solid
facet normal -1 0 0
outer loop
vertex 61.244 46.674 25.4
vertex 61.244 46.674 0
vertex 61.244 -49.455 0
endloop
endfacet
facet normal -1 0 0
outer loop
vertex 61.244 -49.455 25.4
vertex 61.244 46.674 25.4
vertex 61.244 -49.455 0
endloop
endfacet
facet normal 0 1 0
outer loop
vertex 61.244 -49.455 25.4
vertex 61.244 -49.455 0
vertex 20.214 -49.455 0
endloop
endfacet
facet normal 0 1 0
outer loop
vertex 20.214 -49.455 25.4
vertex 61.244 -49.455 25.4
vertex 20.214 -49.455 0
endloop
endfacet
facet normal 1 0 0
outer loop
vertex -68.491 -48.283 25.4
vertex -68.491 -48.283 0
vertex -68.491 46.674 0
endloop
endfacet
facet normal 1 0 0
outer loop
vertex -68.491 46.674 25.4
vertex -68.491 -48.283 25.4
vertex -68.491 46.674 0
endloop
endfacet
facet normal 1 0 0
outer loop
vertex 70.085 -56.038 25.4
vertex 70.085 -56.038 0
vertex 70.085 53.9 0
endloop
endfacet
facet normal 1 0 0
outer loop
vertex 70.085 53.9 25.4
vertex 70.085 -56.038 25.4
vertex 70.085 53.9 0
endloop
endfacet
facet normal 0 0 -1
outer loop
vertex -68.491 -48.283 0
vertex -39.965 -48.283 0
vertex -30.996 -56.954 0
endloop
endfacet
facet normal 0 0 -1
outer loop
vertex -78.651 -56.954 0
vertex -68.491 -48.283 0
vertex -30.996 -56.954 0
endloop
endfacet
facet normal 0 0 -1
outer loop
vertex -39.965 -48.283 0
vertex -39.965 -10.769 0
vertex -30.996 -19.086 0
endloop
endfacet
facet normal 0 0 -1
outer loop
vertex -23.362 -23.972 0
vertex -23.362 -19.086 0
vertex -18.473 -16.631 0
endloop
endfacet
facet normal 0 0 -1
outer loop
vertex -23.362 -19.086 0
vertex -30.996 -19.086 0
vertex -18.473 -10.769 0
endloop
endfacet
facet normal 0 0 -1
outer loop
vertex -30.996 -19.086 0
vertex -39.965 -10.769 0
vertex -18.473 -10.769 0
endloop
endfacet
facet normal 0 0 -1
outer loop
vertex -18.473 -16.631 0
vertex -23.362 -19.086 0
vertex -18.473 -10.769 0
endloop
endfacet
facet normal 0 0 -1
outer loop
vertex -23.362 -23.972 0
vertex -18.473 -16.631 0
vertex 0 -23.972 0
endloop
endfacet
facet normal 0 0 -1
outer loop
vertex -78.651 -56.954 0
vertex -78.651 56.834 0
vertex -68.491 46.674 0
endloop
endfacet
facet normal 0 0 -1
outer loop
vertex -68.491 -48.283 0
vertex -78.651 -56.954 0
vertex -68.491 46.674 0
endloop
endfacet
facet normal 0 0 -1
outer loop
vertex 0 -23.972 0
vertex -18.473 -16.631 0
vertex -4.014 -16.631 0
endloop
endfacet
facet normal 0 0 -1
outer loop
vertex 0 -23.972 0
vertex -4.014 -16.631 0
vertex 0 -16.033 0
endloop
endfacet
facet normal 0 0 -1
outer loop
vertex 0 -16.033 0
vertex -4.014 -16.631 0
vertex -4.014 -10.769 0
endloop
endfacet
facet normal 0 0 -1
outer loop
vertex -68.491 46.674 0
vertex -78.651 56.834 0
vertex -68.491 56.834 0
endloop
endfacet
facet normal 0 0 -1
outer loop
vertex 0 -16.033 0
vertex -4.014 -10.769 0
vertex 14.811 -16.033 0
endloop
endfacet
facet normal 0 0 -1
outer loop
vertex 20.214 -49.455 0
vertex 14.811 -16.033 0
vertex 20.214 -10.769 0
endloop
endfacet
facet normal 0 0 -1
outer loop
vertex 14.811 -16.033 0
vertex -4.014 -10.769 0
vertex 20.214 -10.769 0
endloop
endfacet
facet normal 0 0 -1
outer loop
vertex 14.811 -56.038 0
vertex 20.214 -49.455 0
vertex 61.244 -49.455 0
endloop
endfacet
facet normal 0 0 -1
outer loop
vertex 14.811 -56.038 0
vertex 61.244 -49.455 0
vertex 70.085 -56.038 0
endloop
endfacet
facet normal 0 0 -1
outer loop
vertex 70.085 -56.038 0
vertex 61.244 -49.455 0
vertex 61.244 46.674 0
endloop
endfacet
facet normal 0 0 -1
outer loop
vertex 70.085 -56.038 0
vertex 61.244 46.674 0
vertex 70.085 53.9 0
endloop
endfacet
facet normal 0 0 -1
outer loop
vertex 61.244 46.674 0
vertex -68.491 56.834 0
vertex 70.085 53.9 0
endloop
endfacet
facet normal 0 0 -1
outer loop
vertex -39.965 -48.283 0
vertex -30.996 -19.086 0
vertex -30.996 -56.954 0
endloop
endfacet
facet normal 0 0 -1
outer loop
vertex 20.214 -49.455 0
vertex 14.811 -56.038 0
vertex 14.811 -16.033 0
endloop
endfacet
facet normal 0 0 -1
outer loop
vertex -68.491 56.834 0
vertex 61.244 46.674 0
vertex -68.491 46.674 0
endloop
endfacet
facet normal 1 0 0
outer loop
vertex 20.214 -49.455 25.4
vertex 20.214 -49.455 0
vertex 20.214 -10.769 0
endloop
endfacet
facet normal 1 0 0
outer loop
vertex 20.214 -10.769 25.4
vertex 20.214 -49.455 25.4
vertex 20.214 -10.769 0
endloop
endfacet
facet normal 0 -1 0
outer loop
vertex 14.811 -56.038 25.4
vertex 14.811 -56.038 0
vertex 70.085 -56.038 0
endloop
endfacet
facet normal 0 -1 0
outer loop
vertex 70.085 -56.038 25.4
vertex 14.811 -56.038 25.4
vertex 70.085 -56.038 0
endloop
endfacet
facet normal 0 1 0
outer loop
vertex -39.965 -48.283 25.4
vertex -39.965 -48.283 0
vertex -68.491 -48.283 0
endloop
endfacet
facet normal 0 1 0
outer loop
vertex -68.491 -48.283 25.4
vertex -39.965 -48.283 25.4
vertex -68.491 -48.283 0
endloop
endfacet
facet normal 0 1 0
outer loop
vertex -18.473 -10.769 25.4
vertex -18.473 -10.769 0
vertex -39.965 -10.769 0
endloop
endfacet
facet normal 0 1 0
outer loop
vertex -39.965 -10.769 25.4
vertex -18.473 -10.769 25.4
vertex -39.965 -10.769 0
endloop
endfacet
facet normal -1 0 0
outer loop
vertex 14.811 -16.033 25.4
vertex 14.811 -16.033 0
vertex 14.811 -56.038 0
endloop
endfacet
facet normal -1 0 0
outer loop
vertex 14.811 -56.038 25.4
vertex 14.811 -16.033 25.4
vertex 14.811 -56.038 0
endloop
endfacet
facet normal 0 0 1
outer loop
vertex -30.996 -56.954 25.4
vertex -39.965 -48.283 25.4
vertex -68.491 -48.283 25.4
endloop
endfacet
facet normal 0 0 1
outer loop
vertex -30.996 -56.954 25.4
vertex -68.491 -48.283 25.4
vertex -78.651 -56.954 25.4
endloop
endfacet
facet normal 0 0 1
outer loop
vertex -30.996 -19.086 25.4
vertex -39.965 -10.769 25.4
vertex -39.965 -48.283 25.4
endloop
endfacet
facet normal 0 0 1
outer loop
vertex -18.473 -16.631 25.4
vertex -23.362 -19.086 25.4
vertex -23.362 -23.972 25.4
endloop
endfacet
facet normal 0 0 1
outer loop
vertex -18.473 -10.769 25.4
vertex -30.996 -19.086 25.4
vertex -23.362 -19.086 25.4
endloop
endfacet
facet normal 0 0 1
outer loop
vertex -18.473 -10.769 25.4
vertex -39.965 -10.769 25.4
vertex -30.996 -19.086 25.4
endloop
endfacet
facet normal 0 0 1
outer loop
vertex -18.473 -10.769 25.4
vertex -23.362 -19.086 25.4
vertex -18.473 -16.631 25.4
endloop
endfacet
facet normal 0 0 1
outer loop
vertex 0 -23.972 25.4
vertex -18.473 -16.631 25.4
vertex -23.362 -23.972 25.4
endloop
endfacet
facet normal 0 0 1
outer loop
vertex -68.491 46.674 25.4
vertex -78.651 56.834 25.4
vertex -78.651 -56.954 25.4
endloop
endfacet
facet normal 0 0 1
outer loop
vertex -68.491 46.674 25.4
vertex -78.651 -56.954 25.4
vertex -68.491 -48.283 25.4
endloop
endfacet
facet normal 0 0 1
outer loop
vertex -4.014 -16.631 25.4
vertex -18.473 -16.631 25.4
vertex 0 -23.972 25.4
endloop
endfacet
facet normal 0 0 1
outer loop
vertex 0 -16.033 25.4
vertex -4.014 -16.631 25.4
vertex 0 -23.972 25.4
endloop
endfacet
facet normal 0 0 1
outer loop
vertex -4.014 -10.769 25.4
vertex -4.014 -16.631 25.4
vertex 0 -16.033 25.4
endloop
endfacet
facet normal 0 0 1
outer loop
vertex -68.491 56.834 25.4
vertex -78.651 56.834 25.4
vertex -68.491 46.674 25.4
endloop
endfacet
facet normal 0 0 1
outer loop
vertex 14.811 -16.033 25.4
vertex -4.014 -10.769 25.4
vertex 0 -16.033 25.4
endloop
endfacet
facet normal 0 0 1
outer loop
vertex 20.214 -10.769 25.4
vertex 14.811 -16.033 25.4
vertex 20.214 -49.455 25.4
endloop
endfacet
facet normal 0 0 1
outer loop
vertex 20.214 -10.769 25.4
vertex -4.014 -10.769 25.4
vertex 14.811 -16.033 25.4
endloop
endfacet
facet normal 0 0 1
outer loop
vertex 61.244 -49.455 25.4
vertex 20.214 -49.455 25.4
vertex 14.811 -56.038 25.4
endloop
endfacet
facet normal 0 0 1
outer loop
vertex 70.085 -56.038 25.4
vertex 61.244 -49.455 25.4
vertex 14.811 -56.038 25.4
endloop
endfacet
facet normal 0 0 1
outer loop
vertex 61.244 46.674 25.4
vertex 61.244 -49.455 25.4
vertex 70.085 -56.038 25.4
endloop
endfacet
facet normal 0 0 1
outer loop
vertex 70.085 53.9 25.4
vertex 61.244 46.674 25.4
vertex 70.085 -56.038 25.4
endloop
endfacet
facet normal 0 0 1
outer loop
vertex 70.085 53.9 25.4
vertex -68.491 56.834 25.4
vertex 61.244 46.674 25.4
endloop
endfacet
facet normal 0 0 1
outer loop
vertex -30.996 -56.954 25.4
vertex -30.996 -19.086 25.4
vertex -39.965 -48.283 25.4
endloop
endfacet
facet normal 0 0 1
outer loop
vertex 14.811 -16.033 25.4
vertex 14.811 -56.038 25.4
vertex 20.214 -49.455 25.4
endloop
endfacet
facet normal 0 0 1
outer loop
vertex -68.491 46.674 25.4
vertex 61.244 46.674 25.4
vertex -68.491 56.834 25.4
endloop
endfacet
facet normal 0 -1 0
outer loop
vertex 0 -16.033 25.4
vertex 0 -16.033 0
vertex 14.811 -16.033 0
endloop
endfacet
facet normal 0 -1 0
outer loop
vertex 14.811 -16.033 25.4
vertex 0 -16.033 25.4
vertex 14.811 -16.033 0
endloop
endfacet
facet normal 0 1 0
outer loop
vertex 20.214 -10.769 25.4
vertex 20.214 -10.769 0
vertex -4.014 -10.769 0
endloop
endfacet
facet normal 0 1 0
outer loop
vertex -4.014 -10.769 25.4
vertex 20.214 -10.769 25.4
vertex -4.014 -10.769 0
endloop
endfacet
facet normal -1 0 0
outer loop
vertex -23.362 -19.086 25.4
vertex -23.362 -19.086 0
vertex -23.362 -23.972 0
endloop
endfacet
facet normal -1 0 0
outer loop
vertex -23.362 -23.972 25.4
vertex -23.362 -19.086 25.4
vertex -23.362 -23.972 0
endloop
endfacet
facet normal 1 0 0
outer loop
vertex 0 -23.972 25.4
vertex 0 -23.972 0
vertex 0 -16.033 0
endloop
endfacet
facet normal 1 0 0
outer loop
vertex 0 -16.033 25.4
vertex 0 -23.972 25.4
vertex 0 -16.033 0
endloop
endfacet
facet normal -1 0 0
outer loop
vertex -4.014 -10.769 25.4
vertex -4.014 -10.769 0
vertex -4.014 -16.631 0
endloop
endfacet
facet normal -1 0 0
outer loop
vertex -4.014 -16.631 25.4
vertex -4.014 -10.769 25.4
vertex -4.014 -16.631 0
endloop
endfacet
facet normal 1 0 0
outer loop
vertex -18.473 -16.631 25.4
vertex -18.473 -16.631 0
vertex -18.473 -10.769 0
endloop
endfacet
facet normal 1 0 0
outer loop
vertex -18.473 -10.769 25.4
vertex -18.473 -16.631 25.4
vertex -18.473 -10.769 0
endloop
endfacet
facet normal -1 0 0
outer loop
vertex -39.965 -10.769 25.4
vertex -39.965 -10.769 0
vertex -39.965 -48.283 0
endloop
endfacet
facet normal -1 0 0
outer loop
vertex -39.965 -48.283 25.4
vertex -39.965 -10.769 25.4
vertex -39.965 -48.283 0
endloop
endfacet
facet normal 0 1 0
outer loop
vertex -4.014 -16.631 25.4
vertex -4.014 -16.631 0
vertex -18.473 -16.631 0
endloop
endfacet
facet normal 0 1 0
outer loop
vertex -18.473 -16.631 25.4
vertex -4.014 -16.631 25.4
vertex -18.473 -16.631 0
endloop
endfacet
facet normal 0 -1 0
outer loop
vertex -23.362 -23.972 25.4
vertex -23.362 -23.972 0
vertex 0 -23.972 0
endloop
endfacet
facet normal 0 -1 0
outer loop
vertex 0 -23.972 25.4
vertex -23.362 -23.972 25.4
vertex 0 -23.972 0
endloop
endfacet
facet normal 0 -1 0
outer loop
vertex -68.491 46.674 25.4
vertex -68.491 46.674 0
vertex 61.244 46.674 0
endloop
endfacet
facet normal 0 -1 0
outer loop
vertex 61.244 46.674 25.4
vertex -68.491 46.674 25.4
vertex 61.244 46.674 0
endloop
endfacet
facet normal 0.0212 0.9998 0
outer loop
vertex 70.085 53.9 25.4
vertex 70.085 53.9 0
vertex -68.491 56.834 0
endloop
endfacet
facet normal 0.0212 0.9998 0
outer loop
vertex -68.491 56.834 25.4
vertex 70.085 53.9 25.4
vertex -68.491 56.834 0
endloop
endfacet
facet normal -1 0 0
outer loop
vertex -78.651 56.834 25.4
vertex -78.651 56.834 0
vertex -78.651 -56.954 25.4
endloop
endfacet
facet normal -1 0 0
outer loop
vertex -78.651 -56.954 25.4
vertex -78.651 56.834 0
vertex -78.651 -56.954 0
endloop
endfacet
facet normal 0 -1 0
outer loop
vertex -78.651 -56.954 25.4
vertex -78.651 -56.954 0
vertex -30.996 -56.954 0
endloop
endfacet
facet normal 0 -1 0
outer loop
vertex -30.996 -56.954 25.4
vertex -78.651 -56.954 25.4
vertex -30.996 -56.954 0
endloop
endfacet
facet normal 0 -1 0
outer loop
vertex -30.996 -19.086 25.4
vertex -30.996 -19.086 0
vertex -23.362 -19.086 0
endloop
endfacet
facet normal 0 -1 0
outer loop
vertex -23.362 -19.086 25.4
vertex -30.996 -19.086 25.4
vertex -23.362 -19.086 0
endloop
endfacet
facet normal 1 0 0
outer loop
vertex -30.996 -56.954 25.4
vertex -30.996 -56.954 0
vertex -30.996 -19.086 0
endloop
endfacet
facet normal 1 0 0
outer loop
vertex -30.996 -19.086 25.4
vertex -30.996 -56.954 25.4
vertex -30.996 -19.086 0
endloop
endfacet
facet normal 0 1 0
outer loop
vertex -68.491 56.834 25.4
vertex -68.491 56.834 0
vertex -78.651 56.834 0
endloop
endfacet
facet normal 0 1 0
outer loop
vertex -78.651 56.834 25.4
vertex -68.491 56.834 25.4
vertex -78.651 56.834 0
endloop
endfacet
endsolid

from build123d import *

# Parameters (mm, degrees)
F1_DEPTH = 25.4


with BuildPart() as f1:
    # F0 (on Top) → F1 (new body)
    with BuildSketch(Plane.XY):
        Polygon((70.085101, 53.899866), (-68.491101, 56.833832), (-78.651101, 56.833832), (-78.651101, -56.953683), (-30.996239, -56.953683), (-30.996239, -19.086355), (-23.3617, -19.086355), (-23.3617, -23.972463), (0, -23.972463), (0, -16.032539), (14.811011, -16.032539), (14.811011, -56.037541), (70.085101, -56.037541), align=None)
        Polygon((-68.491101, -10.769275), (-68.491101, 46.673832), (-2.841839, 46.673832), (26.465869, 46.673832), (61.244347, 46.673832), (61.244347, 15.803046), (61.244347, -10.769275), (61.244347, -49.455448), (20.213559, -49.455448), (20.213559, -10.769275), (-4.014147, -10.769275), (-4.014147, -16.630817), (-18.472611, -16.630817), (-18.472611, -10.769275), (-39.964932, -10.769275), (-39.964932, -48.283138), (-68.491101, -48.283138), align=None, mode=Mode.SUBTRACT)
    extrude(amount=F1_DEPTH)


solid = f1.part
